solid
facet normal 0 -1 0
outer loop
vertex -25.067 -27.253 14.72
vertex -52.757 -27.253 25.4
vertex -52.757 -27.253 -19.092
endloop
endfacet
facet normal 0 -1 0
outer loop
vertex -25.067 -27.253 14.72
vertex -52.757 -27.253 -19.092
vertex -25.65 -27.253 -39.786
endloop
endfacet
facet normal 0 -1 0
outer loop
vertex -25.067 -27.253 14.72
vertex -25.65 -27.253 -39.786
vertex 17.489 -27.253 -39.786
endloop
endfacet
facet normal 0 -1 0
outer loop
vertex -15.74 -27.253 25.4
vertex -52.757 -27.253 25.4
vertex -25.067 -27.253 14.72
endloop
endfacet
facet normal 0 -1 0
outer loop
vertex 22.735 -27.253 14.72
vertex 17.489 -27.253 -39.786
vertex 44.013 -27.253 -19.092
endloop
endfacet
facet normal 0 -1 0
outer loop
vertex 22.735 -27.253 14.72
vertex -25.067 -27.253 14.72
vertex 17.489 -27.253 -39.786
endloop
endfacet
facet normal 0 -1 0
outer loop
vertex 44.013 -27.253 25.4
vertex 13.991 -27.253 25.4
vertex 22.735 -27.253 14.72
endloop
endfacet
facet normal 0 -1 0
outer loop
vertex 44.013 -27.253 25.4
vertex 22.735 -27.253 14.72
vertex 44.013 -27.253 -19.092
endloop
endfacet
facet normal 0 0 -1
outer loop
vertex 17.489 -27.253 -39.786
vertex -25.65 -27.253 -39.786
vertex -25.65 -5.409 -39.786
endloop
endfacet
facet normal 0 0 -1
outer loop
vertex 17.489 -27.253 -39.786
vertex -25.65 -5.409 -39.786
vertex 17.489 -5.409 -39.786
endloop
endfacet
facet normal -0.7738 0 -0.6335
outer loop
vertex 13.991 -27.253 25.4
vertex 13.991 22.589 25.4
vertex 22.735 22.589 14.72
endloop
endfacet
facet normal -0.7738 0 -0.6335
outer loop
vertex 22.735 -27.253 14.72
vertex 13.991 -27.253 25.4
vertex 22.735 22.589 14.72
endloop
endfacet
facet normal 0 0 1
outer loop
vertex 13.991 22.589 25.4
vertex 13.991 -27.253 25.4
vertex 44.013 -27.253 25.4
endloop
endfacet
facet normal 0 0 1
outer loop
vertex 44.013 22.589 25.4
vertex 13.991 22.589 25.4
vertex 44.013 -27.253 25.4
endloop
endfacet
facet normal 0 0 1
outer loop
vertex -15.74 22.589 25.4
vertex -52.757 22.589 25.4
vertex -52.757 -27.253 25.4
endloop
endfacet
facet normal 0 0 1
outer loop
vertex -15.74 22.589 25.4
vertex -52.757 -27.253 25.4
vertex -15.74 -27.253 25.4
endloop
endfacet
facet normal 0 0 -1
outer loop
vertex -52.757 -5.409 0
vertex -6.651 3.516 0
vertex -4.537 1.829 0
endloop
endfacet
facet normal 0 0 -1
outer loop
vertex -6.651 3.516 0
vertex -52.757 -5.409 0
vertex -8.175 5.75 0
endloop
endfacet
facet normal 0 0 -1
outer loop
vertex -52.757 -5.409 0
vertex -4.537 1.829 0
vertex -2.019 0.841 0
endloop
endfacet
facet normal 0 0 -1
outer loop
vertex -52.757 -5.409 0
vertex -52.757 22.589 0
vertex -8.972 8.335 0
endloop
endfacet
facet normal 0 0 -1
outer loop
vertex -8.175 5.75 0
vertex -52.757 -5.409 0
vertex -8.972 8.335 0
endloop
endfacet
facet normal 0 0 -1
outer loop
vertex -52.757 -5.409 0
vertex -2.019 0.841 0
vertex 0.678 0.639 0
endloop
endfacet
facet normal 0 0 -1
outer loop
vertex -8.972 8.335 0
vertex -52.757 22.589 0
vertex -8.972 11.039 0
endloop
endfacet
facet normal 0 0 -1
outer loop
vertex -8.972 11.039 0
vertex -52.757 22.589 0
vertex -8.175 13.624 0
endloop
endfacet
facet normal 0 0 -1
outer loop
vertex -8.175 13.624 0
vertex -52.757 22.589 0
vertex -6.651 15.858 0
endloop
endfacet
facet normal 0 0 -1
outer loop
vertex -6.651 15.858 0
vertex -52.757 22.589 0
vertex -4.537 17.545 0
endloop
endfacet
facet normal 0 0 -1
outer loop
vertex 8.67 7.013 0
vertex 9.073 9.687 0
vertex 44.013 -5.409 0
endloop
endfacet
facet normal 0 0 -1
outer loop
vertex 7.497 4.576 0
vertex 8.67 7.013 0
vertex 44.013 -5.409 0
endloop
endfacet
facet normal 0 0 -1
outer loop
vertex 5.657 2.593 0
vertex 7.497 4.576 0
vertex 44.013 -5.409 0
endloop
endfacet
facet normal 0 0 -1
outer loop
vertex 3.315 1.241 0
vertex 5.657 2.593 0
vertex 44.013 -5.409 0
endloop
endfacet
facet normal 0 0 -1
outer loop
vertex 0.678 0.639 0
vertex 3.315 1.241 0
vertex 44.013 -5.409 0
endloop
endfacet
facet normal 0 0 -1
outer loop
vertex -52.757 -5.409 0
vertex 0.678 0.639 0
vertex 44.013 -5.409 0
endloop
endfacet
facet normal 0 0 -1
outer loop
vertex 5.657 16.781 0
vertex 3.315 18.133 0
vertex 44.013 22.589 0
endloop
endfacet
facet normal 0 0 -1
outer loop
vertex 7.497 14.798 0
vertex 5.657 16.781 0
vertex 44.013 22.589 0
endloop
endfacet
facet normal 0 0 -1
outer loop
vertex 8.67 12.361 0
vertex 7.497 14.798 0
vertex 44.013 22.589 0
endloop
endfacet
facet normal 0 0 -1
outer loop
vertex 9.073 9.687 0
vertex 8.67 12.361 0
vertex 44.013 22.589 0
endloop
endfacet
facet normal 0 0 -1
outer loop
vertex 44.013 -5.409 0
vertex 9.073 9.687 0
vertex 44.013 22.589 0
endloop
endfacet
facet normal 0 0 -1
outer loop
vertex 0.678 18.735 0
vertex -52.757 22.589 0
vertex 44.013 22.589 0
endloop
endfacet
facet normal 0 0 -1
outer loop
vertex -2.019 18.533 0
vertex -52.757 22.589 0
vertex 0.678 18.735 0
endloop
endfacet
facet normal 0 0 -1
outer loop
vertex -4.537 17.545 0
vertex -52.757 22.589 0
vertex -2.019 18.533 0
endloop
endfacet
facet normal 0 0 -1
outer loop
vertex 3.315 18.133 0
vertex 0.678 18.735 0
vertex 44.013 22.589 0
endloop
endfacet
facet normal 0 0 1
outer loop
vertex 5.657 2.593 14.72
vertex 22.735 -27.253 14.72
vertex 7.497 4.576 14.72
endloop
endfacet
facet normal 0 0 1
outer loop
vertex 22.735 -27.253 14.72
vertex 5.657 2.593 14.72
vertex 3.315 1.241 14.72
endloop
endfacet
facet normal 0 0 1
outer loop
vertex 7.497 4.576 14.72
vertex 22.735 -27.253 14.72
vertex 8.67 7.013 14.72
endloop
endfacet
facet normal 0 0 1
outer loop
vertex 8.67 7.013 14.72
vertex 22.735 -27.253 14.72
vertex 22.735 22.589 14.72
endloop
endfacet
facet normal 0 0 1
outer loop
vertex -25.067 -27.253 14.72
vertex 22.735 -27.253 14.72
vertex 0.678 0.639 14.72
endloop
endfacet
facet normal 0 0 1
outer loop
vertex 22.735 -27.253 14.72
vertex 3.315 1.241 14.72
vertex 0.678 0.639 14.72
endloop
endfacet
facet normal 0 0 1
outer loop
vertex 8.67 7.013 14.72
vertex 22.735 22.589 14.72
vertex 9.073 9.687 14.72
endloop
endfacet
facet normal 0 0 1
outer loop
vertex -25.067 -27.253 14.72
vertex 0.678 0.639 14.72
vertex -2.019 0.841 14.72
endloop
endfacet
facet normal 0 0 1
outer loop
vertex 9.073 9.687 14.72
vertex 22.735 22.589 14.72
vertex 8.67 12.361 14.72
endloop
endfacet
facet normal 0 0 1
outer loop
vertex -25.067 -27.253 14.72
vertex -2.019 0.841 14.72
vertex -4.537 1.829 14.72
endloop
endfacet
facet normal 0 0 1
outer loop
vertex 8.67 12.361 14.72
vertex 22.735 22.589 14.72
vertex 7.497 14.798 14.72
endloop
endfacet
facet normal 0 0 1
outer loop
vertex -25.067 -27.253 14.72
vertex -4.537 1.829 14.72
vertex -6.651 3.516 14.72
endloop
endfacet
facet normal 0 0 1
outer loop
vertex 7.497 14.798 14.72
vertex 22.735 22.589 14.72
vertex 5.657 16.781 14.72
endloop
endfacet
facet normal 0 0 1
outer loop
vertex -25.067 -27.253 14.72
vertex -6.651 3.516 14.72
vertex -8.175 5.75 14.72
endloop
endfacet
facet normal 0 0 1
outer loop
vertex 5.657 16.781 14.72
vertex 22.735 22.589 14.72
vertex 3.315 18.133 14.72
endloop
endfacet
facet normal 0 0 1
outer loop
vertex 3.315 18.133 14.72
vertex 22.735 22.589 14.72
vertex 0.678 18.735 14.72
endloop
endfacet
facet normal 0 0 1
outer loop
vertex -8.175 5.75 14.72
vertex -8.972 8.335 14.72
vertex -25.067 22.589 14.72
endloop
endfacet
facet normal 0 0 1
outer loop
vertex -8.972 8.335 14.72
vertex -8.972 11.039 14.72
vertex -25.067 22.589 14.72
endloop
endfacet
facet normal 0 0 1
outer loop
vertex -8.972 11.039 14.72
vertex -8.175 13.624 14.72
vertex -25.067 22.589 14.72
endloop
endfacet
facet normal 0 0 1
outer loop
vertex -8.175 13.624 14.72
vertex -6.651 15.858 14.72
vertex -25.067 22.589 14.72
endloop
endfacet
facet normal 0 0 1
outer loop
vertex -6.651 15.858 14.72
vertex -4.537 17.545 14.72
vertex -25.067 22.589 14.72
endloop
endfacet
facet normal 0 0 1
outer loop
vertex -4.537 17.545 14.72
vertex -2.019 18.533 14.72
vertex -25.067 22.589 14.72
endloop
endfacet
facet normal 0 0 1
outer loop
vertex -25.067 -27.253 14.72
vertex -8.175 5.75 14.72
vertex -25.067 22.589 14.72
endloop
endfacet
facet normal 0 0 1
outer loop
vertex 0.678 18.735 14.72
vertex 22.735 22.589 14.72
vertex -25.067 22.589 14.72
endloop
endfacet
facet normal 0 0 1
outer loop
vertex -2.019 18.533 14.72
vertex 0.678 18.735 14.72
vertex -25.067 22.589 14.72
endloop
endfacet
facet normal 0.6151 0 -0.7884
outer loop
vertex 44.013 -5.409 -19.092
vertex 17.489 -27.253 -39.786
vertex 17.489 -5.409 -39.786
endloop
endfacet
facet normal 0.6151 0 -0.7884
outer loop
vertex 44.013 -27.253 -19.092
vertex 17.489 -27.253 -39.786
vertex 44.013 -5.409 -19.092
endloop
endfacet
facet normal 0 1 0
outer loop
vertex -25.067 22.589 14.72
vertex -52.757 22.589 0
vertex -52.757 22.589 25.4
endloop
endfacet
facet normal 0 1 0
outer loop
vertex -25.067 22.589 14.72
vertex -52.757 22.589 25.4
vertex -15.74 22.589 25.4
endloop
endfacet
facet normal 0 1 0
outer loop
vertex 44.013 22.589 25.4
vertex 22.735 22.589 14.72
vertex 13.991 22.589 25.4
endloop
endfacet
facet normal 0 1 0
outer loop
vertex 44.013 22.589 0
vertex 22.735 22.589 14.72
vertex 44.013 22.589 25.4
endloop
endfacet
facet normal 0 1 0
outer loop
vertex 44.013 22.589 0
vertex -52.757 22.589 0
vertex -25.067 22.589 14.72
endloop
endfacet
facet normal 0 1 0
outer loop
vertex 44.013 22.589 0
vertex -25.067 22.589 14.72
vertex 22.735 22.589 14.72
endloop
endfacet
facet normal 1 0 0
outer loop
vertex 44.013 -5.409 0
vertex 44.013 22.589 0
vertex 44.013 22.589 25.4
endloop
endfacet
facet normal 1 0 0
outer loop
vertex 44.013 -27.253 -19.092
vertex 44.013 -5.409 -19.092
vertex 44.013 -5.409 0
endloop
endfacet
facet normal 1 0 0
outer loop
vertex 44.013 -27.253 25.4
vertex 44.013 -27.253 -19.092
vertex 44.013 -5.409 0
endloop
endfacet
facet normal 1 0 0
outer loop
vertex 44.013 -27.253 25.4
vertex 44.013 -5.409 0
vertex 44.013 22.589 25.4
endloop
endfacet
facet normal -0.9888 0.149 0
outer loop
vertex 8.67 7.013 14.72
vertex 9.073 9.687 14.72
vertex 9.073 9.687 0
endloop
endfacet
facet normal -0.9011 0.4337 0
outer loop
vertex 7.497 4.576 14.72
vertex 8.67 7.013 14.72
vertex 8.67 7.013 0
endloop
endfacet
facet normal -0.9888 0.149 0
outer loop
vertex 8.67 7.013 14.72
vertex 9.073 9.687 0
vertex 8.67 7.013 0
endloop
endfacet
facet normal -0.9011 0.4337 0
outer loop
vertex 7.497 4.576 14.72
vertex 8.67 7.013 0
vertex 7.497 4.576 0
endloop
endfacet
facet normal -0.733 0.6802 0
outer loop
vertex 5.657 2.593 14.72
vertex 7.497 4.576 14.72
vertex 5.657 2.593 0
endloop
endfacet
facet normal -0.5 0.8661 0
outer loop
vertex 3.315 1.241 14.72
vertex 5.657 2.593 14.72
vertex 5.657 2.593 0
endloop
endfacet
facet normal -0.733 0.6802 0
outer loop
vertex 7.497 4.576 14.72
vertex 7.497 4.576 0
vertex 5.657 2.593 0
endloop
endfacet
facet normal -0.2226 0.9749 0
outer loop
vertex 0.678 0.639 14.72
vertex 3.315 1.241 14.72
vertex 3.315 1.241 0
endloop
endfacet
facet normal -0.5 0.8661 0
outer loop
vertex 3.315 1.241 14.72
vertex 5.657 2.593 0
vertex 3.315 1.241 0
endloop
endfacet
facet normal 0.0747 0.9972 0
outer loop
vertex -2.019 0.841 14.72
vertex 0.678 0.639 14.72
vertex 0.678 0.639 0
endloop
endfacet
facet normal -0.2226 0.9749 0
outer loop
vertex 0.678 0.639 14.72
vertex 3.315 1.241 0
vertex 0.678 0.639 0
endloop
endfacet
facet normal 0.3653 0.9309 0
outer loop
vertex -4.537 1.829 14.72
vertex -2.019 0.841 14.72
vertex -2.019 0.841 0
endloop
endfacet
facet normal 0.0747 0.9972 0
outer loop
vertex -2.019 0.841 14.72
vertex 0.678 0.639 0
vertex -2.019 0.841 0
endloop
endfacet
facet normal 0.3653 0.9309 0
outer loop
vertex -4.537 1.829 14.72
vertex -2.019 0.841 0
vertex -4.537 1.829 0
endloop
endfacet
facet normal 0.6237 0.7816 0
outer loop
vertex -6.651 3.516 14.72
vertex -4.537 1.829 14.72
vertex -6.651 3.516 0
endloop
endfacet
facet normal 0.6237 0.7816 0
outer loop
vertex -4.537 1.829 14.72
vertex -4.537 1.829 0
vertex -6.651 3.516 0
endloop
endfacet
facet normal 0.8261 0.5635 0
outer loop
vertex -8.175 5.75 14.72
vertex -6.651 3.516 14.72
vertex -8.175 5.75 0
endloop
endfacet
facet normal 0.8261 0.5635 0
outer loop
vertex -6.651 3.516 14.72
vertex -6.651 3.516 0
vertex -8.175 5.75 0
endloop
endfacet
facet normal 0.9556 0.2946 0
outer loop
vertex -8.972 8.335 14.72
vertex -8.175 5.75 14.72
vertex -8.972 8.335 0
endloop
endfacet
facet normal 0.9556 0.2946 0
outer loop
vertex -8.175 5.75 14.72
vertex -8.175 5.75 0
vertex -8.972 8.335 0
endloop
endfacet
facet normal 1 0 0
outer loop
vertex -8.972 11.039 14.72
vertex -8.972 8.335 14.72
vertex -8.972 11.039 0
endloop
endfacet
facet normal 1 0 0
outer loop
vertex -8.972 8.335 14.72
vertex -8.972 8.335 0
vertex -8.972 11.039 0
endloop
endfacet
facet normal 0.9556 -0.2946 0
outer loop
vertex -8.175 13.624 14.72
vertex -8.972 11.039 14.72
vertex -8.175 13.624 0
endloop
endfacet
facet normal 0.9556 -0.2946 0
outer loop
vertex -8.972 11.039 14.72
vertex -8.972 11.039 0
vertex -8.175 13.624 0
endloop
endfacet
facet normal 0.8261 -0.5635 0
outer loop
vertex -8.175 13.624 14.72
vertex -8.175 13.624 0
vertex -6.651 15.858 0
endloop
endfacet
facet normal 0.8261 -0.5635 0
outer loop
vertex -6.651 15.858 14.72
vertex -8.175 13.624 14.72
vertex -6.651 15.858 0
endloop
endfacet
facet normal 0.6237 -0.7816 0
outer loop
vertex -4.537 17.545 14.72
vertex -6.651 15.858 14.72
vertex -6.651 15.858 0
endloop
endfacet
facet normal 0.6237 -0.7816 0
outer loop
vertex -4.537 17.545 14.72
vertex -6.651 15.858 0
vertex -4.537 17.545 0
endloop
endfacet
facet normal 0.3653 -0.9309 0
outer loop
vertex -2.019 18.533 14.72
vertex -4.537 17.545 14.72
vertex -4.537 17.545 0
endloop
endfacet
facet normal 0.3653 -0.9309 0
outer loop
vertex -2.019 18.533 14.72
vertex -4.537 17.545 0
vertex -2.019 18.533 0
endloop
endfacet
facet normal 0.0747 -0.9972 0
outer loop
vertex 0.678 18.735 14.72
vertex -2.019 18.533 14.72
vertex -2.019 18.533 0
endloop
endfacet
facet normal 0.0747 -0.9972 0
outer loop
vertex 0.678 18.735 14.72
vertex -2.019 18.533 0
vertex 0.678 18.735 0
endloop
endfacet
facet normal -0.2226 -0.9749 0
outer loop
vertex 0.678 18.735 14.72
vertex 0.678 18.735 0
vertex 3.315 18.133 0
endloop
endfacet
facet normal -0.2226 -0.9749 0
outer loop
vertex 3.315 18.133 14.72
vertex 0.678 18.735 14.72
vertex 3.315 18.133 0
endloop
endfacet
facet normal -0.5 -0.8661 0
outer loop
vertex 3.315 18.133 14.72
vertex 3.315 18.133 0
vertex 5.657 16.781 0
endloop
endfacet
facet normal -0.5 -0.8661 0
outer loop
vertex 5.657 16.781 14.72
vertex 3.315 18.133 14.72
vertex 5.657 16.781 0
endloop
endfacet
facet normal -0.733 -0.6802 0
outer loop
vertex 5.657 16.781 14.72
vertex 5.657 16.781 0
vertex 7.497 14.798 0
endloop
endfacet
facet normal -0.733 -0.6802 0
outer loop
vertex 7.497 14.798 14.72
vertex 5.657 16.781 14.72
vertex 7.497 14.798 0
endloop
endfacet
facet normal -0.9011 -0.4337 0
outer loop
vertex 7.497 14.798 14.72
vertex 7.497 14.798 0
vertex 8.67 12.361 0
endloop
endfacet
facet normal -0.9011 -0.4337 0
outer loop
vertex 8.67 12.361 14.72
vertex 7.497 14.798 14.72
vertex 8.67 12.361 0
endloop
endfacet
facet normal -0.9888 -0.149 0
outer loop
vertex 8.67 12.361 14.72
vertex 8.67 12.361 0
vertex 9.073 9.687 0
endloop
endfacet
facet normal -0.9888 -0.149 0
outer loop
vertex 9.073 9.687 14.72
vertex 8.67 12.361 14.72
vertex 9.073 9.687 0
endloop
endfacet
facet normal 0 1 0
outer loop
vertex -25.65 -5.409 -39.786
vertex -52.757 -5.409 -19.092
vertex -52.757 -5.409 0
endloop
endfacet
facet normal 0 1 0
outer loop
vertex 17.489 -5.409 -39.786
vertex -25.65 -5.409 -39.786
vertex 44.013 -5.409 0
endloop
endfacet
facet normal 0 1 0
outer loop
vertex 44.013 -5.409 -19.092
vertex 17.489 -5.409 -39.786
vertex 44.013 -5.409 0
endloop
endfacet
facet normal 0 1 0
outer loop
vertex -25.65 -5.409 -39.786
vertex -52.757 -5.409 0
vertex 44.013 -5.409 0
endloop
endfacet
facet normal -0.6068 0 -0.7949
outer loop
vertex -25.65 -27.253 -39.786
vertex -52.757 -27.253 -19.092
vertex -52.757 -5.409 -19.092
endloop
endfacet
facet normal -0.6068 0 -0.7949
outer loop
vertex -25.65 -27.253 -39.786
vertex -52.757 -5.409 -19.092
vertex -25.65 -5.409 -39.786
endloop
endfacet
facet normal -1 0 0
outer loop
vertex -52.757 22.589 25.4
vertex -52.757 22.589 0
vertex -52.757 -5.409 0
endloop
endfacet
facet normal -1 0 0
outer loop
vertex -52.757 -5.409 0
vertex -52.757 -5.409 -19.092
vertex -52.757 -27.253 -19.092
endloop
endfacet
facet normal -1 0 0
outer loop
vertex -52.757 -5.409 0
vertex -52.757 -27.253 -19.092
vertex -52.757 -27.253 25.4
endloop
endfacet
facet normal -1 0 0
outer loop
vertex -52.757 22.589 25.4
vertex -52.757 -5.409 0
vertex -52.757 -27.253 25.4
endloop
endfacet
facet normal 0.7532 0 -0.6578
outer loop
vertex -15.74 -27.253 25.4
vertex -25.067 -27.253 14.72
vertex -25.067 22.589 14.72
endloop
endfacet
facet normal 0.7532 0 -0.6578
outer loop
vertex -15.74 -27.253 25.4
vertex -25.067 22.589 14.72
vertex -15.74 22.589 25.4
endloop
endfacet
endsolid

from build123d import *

# Parameters (mm, degrees)
F0_W     = 96.76984
F0_H     = 49.842296
F1_DEPTH = 25.4
F2_W     = 96.76984
F2_H     = 44.49164
F3_DEPTH = 21.844
F5_DEPTH = 64.516
F6_R     = 9.073272
F7_DEPTH = 25.4


with BuildPart() as f1:
    # F0 (on Top) → F1 (new body)
    with BuildSketch(Plane.XY):
        with Locations((-4.372131, -2.331802)):
            Rectangle(F0_W, F0_H)
    extrude(amount=F1_DEPTH)

    # F2 (on face) → F3 (join)
    with BuildSketch(Plane.XZ.offset(27.25295)):
        with Locations((-4.372131, 3.15418)):
            Rectangle(F2_W, F2_H)
        Polygon((17.488524, -39.786395), (44.012789, -19.09164), (-52.757051, -19.09164), (-25.649834, -39.786395), align=None)
    extrude(amount=-F3_DEPTH)

    # F4 (on face) → F5 (cut)
    with BuildSketch(Plane(origin=(0, 22.589346, 0), x_dir=(-1, 0, 0), z_dir=(0, 1, 0))):
        Polygon((25.066886, 14.719509), (15.739672, 25.4), (-13.990819, 25.4), (-22.735082, 14.719509), align=None)
    extrude(amount=-F5_DEPTH, mode=Mode.SUBTRACT)

    # F6 (on face) → F7 (cut)
    with BuildSketch(Plane(origin=(0, 0, 0), x_dir=(1, 0, 0), z_dir=(0, 0, -1))):
        with Locations((0, -9.686902)):
            Circle(F6_R)
    extrude(amount=-F7_DEPTH, mode=Mode.SUBTRACT)


solid = f1.part
